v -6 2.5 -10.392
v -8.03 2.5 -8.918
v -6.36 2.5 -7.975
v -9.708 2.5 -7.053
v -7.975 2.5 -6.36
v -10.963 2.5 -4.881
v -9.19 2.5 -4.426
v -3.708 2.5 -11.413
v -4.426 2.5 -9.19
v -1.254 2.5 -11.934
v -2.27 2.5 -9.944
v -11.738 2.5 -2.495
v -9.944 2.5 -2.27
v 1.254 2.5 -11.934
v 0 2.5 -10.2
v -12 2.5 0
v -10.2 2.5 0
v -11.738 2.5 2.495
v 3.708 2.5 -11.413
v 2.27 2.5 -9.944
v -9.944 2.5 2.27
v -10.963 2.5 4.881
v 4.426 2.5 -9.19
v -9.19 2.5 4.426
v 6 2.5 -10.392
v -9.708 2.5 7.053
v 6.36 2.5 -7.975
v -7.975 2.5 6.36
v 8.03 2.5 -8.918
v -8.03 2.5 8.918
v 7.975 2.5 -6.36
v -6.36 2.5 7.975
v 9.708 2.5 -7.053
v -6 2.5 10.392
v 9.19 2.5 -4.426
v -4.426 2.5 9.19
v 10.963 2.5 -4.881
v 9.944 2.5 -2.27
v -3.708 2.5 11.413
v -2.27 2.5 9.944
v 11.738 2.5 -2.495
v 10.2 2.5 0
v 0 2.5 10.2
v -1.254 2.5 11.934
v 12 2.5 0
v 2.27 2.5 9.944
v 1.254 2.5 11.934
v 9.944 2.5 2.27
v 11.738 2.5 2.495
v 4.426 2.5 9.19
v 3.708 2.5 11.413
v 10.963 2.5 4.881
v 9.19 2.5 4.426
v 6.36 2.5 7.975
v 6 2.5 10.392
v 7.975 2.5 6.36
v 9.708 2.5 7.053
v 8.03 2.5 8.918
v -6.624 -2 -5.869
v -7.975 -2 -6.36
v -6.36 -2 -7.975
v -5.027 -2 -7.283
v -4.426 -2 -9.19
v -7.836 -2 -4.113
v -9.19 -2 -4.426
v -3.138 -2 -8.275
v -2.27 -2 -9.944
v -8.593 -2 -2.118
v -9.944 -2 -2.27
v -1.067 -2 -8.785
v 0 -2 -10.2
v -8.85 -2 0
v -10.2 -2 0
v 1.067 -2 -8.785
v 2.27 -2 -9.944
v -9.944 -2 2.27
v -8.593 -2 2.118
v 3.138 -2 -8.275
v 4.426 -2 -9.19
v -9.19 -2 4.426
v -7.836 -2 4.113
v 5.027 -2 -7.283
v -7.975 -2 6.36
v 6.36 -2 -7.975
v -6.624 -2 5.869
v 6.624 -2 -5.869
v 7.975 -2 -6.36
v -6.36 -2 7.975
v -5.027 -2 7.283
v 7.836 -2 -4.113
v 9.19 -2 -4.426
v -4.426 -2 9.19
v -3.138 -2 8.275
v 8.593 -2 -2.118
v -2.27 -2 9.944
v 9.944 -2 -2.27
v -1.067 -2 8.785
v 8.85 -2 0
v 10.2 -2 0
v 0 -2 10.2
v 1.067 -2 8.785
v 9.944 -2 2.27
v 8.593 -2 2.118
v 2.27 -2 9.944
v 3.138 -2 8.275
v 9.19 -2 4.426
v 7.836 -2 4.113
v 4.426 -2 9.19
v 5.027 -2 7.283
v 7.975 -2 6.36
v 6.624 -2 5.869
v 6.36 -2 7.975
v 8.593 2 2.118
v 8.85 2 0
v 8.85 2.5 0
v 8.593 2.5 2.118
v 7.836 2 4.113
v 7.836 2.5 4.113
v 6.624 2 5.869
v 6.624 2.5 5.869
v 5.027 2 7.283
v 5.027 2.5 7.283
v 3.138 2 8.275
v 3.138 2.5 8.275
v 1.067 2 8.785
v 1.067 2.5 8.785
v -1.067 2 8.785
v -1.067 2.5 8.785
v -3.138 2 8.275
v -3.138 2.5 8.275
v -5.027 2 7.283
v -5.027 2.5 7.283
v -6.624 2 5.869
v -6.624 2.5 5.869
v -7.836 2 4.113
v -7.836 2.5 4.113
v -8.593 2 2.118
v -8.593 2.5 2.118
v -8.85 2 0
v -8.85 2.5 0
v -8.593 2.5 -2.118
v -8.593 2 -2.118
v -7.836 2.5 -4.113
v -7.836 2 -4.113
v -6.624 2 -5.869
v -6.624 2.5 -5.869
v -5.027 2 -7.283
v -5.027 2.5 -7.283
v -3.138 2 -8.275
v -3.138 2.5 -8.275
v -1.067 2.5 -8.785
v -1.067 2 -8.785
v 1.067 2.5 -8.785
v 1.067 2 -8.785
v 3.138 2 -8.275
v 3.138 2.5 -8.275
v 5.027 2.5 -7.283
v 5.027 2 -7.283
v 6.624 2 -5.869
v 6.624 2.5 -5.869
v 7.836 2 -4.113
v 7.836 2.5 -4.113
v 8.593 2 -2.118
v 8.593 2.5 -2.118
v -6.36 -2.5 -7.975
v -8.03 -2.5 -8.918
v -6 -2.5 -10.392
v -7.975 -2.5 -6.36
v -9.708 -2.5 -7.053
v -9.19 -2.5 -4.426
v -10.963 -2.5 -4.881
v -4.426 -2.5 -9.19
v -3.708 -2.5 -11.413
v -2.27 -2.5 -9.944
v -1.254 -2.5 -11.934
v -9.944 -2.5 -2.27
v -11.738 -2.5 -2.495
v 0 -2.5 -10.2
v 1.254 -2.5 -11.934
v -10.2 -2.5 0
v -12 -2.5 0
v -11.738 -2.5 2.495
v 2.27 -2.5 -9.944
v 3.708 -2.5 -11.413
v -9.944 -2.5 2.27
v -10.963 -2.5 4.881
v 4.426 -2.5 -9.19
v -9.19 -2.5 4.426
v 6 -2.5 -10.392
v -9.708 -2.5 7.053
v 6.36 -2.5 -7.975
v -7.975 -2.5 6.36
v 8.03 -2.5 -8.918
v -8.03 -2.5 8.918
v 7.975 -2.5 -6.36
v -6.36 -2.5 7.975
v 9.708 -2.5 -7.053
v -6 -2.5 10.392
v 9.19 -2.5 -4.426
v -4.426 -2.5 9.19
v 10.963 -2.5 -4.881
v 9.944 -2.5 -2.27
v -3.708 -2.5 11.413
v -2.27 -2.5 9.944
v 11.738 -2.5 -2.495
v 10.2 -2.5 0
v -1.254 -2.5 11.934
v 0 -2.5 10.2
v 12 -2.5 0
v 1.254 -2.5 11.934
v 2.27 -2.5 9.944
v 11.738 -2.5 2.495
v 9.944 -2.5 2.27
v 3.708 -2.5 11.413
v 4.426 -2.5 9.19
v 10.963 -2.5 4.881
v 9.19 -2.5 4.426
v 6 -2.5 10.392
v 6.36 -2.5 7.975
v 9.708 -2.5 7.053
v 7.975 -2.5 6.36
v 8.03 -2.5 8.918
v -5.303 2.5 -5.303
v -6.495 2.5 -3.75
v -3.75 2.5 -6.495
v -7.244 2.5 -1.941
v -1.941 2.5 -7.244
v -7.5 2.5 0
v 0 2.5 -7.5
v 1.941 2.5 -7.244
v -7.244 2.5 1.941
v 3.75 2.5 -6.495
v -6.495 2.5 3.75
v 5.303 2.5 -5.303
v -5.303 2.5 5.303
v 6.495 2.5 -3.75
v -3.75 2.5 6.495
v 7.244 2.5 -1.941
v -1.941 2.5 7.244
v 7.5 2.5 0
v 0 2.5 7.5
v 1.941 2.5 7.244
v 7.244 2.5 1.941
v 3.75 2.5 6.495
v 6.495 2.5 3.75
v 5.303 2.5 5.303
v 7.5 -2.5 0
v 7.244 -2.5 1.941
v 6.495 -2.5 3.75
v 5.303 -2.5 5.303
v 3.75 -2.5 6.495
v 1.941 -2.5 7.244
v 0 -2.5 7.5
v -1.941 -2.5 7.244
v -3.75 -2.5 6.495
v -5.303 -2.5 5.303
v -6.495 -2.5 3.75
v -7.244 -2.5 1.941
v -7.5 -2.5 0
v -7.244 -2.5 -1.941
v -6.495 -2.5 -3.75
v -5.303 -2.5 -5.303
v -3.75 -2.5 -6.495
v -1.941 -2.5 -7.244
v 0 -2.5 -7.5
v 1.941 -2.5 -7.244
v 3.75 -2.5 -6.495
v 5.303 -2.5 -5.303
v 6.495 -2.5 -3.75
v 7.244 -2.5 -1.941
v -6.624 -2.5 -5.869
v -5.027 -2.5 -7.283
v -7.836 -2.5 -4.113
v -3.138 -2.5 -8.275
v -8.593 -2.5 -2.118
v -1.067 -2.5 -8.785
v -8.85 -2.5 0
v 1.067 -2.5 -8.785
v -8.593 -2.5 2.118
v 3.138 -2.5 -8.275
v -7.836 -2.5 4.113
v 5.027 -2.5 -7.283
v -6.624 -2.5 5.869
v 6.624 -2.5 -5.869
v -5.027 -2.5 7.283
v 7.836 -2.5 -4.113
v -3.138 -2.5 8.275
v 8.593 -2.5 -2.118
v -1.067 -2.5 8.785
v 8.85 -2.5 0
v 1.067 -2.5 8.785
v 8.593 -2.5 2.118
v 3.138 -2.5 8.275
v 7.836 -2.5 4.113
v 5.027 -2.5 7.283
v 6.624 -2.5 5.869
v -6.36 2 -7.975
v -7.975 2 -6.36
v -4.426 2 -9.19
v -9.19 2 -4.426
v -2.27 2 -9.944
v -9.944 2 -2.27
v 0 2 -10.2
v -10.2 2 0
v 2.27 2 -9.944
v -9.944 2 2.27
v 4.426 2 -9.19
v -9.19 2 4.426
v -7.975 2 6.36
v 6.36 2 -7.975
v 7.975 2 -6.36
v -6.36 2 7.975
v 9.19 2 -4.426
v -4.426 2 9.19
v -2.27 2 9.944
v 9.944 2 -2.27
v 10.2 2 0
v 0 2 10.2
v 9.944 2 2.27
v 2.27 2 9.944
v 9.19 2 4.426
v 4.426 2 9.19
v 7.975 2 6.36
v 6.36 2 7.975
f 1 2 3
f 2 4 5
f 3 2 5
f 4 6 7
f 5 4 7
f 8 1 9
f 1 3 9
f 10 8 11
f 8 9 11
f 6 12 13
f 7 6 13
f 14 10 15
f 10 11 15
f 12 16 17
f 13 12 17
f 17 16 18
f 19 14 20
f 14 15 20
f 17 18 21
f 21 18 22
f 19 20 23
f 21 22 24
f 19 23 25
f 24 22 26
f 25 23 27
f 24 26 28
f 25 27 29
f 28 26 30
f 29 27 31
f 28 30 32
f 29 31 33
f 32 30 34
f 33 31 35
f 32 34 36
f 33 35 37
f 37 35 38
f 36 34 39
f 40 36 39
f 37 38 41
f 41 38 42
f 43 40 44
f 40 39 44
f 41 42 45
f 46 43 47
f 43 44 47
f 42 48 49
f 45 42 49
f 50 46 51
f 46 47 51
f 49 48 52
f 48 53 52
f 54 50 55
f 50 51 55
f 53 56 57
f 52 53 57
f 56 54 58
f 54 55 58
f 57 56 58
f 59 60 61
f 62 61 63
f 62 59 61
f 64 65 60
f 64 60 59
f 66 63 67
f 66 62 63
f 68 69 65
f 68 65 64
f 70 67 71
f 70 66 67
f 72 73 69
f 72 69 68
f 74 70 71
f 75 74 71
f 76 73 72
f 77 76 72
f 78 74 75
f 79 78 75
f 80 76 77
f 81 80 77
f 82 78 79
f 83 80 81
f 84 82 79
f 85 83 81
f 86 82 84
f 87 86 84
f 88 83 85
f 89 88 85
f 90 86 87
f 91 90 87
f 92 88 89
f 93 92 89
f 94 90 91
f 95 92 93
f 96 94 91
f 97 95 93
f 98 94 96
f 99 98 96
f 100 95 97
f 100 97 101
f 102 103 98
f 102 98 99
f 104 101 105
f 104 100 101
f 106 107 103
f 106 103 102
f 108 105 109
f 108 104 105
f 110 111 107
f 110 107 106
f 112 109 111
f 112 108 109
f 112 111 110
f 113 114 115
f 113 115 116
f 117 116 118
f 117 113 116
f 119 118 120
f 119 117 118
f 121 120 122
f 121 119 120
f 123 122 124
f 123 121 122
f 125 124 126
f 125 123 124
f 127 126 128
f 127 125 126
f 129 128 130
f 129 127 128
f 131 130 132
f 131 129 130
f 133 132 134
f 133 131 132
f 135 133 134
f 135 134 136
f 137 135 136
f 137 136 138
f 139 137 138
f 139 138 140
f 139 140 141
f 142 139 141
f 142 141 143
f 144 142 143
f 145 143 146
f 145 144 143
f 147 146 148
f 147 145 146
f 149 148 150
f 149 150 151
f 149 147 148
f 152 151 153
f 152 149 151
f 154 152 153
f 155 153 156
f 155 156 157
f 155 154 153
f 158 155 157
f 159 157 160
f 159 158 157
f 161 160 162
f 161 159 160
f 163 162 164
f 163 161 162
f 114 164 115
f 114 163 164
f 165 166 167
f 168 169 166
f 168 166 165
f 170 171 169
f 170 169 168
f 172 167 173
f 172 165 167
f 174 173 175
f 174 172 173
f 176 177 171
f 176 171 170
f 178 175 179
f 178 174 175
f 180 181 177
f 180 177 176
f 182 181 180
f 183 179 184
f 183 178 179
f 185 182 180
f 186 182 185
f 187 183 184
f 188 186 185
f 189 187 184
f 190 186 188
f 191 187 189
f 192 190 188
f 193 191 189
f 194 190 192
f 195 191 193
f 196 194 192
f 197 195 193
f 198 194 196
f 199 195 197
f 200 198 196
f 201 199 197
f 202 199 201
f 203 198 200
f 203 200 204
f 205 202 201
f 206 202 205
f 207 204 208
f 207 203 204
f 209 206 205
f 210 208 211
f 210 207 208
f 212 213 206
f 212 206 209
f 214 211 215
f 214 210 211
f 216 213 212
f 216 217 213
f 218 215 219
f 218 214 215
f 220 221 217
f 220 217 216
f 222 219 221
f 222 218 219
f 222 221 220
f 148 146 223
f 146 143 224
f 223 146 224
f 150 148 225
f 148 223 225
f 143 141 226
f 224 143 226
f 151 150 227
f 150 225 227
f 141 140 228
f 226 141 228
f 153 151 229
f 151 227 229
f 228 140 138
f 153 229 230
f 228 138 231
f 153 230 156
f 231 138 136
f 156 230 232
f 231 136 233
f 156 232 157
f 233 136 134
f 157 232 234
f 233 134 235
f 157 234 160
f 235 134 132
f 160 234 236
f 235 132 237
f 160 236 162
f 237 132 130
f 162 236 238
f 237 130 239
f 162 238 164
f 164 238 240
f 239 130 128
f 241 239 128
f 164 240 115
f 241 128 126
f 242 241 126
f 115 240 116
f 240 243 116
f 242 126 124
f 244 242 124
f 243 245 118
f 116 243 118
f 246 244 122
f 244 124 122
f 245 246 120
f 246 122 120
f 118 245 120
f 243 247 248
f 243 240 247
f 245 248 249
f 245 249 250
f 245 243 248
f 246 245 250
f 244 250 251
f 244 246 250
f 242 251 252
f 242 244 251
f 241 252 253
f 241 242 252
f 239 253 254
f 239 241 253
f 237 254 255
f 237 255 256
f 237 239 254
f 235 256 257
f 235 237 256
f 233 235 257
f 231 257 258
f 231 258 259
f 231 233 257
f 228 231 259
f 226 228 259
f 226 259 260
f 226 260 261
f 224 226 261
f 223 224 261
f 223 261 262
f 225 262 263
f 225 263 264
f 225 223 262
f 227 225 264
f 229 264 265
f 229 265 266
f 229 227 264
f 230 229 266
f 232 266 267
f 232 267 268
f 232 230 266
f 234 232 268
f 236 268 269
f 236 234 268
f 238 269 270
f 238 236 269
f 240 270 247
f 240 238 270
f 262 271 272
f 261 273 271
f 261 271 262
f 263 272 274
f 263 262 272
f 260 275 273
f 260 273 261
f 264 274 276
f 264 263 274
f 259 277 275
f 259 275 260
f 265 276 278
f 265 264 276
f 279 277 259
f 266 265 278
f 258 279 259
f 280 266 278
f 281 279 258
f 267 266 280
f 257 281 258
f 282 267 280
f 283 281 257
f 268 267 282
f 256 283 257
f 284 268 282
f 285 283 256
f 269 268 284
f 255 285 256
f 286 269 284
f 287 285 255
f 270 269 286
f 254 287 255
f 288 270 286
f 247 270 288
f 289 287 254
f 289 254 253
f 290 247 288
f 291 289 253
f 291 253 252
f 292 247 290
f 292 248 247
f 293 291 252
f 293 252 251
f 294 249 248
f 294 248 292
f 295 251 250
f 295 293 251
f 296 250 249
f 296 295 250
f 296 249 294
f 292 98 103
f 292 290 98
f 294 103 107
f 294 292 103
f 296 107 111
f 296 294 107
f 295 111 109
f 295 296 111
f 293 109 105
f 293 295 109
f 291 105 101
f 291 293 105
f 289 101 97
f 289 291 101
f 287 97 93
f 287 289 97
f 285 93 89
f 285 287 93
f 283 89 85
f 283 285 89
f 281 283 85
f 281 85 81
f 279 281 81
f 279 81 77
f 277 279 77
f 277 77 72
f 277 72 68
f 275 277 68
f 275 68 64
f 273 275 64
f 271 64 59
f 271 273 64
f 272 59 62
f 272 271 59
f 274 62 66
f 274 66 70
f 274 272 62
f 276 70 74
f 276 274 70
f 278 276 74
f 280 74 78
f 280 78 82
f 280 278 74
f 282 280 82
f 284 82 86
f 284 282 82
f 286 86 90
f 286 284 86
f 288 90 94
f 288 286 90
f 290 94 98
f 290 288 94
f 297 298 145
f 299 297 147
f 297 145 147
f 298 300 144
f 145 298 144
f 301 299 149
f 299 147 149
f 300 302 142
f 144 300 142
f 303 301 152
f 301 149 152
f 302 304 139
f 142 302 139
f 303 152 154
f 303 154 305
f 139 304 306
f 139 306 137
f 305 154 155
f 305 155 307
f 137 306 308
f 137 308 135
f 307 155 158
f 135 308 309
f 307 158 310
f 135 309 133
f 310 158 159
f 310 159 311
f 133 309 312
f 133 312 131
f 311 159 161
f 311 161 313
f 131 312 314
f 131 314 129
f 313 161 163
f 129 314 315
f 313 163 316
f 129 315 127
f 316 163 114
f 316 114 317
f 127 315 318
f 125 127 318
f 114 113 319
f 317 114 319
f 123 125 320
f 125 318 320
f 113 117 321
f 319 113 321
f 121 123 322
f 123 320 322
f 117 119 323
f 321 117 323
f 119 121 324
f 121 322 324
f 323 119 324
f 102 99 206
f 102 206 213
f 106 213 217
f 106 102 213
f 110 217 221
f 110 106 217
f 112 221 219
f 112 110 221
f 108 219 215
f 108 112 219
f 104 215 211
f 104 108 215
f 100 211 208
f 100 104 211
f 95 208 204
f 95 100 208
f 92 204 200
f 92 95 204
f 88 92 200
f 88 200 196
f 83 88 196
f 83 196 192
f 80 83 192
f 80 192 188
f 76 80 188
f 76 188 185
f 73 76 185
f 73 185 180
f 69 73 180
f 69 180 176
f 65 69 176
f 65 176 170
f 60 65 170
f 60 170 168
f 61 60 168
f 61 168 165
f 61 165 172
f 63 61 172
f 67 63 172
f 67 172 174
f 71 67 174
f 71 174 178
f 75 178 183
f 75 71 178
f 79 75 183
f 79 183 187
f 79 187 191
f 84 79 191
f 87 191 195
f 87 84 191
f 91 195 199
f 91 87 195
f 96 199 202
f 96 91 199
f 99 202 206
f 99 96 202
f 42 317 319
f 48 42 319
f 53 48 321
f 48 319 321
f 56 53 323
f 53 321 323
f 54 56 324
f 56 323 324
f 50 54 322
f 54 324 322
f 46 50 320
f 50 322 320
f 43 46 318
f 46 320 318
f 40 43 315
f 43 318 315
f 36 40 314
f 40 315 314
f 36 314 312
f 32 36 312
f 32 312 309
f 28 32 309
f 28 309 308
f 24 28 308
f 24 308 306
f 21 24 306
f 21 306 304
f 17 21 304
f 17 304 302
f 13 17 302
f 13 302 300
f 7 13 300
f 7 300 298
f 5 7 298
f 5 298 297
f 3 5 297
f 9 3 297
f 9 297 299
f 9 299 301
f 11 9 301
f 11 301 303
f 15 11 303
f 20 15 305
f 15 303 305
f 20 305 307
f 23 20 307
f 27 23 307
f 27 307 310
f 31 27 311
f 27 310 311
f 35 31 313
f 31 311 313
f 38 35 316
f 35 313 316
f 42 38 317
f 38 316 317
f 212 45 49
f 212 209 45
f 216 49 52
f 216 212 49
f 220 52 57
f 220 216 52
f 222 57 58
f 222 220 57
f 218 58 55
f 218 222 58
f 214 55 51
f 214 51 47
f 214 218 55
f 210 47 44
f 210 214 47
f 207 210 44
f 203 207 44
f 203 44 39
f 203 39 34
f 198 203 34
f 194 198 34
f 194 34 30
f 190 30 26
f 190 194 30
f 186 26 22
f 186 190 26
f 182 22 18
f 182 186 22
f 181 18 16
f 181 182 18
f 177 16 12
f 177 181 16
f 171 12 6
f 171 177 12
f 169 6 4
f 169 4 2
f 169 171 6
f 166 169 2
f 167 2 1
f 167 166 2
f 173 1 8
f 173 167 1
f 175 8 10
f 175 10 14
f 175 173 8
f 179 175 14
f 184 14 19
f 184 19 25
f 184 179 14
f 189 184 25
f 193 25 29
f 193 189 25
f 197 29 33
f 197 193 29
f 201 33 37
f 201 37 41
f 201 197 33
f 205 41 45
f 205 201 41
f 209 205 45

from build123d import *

# Parameters (mm, degrees)
F1_R     = 10.2
F1_R_2   = 8.85
F2_DEPTH = 2
F1_R_3   = 12
F1_R_4   = 7.5
F3_DEPTH = 2.5


with BuildPart() as f2:
    # F1 (on Front) → F2 (new body, symmetric)
    with BuildSketch(Plane.XZ):
        Circle(F1_R)
        Circle(F1_R_2, mode=Mode.SUBTRACT)
    extrude(amount=F2_DEPTH, both=True)

    # F1 (on Front) → F3 (join, symmetric)
    with BuildSketch(Plane.XZ):
        Circle(F1_R_3)
        Circle(F1_R, mode=Mode.SUBTRACT)
        Circle(F1_R_2)
        Circle(F1_R_4, mode=Mode.SUBTRACT)
    extrude(amount=F3_DEPTH, both=True)


solid = f2.part
